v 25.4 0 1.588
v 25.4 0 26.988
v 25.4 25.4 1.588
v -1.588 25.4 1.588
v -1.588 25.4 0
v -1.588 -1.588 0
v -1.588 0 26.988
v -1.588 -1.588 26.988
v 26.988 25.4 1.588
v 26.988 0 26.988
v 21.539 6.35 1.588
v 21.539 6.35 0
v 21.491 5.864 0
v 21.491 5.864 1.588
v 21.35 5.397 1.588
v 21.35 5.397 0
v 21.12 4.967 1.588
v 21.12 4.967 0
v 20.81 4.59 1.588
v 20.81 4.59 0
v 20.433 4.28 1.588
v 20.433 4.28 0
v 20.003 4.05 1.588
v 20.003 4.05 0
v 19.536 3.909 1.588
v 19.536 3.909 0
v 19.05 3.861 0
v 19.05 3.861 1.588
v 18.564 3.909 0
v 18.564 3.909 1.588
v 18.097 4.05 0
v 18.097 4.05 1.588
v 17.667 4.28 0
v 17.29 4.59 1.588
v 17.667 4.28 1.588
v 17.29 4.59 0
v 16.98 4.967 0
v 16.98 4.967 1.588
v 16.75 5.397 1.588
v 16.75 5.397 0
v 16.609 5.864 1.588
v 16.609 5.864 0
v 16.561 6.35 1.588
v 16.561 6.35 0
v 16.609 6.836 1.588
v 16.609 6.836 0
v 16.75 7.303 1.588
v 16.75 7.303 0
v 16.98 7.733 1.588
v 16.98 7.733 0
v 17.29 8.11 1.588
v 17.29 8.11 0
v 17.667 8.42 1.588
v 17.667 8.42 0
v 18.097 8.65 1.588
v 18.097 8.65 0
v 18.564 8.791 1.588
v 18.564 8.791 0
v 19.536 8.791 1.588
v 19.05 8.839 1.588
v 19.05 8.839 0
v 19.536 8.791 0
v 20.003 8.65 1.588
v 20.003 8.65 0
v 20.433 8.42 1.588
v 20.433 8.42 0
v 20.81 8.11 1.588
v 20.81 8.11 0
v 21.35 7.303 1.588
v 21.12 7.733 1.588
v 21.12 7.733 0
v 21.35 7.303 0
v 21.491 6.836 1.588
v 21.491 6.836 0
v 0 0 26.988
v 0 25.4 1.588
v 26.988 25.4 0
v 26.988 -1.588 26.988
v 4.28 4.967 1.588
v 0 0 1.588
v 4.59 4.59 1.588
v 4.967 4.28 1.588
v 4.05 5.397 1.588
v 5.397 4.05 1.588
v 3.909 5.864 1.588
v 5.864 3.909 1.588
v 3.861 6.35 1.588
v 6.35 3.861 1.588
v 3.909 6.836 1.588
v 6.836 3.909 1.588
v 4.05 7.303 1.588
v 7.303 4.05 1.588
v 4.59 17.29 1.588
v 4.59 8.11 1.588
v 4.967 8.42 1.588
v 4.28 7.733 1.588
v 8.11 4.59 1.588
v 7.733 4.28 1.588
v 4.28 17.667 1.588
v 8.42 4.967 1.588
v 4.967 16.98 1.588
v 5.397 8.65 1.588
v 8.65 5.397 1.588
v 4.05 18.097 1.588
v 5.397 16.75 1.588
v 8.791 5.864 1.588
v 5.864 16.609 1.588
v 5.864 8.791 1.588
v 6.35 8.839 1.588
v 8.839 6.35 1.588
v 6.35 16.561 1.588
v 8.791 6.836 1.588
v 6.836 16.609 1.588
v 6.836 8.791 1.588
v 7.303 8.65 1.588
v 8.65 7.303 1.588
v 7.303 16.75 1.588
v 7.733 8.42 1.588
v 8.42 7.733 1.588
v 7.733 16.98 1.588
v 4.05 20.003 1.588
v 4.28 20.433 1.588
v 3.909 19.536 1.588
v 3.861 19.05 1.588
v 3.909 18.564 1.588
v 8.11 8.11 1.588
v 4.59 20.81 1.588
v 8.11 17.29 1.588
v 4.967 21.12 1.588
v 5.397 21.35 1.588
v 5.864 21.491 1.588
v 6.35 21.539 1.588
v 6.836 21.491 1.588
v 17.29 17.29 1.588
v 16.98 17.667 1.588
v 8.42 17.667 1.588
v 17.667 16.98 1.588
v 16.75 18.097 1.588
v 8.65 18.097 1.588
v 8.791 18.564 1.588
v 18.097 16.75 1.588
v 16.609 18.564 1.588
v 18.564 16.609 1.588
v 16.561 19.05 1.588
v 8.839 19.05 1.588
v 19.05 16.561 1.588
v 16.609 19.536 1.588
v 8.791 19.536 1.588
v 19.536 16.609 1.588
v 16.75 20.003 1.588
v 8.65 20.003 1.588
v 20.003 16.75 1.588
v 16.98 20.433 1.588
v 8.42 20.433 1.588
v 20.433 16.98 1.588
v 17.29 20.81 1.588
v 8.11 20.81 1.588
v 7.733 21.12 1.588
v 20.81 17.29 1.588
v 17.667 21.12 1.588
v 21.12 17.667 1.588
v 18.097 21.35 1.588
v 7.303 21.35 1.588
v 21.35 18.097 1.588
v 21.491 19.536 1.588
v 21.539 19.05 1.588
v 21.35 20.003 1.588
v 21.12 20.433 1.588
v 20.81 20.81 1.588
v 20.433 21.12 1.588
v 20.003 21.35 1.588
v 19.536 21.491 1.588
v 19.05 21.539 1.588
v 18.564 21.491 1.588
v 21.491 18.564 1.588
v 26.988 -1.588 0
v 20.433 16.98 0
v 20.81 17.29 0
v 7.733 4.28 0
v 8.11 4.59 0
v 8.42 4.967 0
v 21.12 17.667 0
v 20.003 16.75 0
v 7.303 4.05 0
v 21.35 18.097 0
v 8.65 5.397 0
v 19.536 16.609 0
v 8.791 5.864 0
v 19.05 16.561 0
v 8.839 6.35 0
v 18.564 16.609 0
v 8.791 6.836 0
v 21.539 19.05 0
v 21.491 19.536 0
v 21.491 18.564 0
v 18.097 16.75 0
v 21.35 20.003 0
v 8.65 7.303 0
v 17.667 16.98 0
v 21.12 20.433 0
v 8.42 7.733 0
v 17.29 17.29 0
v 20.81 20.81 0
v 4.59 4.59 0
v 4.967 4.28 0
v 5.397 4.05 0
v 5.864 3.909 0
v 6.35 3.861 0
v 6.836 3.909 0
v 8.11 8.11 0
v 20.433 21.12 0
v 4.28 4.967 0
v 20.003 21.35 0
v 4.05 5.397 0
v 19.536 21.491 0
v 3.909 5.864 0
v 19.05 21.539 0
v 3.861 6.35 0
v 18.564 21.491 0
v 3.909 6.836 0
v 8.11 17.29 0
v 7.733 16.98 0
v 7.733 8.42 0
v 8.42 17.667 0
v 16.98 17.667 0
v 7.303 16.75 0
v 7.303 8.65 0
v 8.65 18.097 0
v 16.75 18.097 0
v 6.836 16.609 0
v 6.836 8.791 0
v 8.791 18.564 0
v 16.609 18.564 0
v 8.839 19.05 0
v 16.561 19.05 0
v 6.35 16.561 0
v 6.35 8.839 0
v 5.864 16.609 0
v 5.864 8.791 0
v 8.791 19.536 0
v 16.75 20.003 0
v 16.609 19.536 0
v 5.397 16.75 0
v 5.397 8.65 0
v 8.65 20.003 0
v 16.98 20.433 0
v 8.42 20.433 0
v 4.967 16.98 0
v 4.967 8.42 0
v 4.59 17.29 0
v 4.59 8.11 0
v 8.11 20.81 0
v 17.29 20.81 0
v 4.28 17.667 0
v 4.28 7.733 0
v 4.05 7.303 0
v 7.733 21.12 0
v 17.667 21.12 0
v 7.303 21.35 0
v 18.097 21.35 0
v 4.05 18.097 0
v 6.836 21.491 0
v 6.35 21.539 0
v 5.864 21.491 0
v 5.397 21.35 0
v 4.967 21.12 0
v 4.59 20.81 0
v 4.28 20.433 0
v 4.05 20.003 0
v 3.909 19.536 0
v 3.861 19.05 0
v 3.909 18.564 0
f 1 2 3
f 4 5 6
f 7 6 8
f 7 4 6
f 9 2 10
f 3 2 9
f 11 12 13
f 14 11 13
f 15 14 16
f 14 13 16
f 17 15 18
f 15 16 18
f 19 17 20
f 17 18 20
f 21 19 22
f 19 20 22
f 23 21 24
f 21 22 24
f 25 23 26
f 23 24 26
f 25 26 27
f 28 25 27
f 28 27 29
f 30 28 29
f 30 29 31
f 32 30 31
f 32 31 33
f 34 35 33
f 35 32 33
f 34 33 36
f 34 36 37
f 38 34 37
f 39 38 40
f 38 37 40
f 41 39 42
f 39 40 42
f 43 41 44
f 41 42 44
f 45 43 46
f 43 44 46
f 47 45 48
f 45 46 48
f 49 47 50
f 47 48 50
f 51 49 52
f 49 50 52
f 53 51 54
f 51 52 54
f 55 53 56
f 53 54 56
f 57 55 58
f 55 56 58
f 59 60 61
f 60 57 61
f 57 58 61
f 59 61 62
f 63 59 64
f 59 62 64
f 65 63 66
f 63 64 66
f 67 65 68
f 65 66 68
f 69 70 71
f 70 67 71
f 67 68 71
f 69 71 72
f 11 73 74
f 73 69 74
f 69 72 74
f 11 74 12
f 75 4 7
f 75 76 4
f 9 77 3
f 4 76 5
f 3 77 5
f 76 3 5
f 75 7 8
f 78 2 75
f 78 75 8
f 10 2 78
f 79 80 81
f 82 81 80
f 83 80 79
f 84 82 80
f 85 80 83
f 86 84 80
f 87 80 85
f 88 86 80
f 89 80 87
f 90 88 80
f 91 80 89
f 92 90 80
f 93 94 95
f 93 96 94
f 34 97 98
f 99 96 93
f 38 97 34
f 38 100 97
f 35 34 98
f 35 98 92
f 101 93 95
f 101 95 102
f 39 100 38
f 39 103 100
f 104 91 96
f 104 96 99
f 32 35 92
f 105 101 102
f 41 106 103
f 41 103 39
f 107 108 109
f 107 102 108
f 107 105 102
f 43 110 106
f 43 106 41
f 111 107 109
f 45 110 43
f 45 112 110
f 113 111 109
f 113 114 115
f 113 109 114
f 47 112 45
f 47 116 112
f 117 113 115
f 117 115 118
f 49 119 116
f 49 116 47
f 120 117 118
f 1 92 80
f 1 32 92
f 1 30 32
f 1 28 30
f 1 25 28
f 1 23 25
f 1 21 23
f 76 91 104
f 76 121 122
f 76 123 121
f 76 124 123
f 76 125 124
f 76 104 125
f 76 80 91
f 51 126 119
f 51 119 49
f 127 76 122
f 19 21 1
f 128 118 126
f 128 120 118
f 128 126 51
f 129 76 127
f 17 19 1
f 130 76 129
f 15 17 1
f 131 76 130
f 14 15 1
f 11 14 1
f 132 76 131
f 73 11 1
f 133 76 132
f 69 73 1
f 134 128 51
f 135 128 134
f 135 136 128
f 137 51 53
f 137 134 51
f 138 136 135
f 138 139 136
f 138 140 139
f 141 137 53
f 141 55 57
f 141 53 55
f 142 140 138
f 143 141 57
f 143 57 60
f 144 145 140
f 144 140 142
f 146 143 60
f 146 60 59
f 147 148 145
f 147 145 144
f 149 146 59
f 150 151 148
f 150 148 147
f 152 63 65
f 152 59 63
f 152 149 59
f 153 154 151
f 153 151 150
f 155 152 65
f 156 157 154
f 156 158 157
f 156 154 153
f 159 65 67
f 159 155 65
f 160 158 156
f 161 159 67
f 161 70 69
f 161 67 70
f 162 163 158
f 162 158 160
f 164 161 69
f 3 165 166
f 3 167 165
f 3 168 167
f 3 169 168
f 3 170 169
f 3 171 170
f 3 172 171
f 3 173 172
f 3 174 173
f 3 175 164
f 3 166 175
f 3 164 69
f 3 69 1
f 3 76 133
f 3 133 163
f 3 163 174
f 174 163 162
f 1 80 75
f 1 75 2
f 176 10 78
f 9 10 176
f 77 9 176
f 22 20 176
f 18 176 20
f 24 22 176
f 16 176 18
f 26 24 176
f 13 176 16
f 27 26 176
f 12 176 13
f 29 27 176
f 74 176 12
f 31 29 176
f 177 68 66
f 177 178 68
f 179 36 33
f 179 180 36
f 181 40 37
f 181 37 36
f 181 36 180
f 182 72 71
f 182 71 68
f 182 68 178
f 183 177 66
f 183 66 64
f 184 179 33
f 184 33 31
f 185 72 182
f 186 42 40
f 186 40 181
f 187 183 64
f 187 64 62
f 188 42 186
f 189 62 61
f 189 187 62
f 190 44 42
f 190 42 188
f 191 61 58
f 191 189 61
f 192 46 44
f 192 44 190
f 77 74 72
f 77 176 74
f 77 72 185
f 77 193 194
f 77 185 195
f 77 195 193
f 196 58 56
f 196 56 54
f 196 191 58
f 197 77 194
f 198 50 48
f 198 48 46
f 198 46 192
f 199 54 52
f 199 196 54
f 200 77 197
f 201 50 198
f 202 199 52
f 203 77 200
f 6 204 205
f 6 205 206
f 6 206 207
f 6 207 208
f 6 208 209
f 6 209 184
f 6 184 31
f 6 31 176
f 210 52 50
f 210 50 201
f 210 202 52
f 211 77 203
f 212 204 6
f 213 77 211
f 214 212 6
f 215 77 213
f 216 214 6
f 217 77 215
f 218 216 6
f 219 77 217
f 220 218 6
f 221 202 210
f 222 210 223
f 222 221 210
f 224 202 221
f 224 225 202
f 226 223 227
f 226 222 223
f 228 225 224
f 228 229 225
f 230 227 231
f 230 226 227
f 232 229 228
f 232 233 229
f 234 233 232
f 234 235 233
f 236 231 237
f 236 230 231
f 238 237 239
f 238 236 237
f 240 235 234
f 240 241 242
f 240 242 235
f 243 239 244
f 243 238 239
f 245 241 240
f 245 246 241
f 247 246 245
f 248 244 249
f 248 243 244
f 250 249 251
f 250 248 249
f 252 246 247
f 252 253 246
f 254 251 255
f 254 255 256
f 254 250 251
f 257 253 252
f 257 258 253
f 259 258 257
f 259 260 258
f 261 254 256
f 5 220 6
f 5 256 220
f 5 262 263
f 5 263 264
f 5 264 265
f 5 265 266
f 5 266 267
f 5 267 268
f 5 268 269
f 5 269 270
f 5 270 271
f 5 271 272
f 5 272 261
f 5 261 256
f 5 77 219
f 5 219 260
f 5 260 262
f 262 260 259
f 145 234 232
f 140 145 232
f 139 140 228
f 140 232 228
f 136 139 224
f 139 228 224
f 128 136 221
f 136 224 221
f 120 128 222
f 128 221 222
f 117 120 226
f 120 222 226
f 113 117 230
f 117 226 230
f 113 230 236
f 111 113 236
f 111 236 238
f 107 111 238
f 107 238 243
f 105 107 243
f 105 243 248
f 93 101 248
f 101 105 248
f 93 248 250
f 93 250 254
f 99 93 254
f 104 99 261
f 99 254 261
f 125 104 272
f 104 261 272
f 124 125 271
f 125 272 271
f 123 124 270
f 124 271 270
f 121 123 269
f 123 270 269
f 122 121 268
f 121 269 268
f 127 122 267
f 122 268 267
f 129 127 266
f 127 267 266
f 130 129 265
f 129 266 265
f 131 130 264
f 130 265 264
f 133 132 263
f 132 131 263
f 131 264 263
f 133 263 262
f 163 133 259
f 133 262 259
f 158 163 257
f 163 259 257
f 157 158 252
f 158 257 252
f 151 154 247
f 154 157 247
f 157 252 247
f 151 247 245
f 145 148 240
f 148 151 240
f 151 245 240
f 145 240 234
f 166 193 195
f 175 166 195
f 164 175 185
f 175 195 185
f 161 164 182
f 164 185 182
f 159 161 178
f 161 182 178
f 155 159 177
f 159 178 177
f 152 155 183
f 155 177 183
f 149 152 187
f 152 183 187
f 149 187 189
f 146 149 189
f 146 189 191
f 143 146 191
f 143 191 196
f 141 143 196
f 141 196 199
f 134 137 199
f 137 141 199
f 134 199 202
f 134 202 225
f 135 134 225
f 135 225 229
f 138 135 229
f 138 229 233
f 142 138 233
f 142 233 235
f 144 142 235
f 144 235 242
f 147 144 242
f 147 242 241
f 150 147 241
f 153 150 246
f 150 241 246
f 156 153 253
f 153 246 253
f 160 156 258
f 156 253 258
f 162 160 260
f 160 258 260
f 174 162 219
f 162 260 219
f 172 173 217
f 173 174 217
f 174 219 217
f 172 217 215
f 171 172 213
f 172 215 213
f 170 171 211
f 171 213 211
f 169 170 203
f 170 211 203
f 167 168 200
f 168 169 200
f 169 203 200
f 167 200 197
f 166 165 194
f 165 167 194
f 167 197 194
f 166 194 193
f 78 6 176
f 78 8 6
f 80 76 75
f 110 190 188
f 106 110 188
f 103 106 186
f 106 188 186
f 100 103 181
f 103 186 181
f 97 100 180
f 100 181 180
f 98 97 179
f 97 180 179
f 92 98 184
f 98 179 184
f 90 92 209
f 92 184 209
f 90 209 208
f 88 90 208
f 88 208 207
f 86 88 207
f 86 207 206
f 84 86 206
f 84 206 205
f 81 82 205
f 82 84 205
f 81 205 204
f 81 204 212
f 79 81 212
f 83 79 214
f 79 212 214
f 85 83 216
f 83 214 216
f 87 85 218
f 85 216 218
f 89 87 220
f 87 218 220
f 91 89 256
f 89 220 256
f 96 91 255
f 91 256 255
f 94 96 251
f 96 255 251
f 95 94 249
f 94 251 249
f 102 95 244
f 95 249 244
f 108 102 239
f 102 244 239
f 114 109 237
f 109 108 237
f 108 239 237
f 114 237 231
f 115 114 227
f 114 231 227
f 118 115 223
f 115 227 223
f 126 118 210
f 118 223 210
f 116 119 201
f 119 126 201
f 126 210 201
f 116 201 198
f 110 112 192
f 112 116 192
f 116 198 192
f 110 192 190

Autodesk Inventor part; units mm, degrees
ref_plane "YZ Plane" through (0, 0, 0) normal (1, 0, 0) x (0, 1, 0)
ref_plane "XZ Plane" through (0, 0, 0) normal (0, 1, 0) x (-1, 0, 0)
ref_plane "XY Plane" through (0, 0, 0) normal (0, 0, 1) x (1, 0, 0)
sketch "Sketch1" plane through (0, 0, 0) normal (0, 0, 1) x (1, 0, 0)
  line L0 (0, 0) -> (25.4, 0)
  line L1 (25.4, 0) -> (25.4, 25.4)
  line L2 (25.4, 25.4) -> (0, 25.4)
  line L3 (0, 25.4) -> (0, 0)
  circle A0 centre (6.35, 19.05) radius 2.4892
  line L4 (12.7, 25.4) -> (12.7, 0) construction
  line L5 (0, 12.7) -> (25.4, 12.7) construction
  circle A1 centre (19.05, 19.05) radius 2.4892
  circle A2 centre (6.35, 6.35) radius 2.4892
  circle A3 centre (19.05, 6.35) radius 2.4892
  dimension "d0" = 25.4
  dimension "d1" = 25.4
  dimension "d2" = 4.9784
  dimension "d3" = 6.35
  dimension "d4" = 6.35
extrude "Extrusion1" add sketch "Sketch1" along normal blind 1.5875
sketch "Sketch2" plane through (0, 0, 0) normal (-1, 0, 0) x (0, 0, 1)
  line L0 (0, 25.4) -> (0, 0) projected
  line L1 (0, 0) -> (1.5875, 0) projected
  line L2 (0, 25.4) -> (1.5875, 25.4) projected
  line L3 (1.5875, 25.4) -> (26.9875, 0)
  line L4 (1.5875, 25.4) -> (37.5085, 25.4) construction
  line L5 (26.9875, 0) -> (1.5875, 0)
  line L6 (1.5875, 25.4) -> (1.5875, 0)
  dimension "d7" = 45
extrude "Extrusion2" add sketch "Sketch2" along normal blind 1.5875
ref_plane "Work Plane1" through (12.7, 0, 0) normal (1, 0, 0) x (0, 0, -1)
mirror "Mirror1" about plane through (12.7, 0, 0) normal (1, 0, 0) of "Extrusion2"
sketch "Sketch3" plane through (0, 0, 1.5875) normal (0, -1, 0) x (1, 0, 0)
  line L0 (-1.5875, 25.4) -> (26.9875, 25.4)
  line L1 (26.9875, 25.4) -> (26.9875, -1.5875)
  line L2 (26.9875, -1.5875) -> (-1.5875, -1.5875)
  line L3 (-1.5875, -1.5875) -> (-1.5875, 25.4)
  point P0 (0, -1.5875)
extrude "Extrusion3" add sketch "Sketch3" along normal blind 1.5875
equation "\"d4\" = d3"
properties part number "Milled Flange Support" material "Aluminum 6061"
